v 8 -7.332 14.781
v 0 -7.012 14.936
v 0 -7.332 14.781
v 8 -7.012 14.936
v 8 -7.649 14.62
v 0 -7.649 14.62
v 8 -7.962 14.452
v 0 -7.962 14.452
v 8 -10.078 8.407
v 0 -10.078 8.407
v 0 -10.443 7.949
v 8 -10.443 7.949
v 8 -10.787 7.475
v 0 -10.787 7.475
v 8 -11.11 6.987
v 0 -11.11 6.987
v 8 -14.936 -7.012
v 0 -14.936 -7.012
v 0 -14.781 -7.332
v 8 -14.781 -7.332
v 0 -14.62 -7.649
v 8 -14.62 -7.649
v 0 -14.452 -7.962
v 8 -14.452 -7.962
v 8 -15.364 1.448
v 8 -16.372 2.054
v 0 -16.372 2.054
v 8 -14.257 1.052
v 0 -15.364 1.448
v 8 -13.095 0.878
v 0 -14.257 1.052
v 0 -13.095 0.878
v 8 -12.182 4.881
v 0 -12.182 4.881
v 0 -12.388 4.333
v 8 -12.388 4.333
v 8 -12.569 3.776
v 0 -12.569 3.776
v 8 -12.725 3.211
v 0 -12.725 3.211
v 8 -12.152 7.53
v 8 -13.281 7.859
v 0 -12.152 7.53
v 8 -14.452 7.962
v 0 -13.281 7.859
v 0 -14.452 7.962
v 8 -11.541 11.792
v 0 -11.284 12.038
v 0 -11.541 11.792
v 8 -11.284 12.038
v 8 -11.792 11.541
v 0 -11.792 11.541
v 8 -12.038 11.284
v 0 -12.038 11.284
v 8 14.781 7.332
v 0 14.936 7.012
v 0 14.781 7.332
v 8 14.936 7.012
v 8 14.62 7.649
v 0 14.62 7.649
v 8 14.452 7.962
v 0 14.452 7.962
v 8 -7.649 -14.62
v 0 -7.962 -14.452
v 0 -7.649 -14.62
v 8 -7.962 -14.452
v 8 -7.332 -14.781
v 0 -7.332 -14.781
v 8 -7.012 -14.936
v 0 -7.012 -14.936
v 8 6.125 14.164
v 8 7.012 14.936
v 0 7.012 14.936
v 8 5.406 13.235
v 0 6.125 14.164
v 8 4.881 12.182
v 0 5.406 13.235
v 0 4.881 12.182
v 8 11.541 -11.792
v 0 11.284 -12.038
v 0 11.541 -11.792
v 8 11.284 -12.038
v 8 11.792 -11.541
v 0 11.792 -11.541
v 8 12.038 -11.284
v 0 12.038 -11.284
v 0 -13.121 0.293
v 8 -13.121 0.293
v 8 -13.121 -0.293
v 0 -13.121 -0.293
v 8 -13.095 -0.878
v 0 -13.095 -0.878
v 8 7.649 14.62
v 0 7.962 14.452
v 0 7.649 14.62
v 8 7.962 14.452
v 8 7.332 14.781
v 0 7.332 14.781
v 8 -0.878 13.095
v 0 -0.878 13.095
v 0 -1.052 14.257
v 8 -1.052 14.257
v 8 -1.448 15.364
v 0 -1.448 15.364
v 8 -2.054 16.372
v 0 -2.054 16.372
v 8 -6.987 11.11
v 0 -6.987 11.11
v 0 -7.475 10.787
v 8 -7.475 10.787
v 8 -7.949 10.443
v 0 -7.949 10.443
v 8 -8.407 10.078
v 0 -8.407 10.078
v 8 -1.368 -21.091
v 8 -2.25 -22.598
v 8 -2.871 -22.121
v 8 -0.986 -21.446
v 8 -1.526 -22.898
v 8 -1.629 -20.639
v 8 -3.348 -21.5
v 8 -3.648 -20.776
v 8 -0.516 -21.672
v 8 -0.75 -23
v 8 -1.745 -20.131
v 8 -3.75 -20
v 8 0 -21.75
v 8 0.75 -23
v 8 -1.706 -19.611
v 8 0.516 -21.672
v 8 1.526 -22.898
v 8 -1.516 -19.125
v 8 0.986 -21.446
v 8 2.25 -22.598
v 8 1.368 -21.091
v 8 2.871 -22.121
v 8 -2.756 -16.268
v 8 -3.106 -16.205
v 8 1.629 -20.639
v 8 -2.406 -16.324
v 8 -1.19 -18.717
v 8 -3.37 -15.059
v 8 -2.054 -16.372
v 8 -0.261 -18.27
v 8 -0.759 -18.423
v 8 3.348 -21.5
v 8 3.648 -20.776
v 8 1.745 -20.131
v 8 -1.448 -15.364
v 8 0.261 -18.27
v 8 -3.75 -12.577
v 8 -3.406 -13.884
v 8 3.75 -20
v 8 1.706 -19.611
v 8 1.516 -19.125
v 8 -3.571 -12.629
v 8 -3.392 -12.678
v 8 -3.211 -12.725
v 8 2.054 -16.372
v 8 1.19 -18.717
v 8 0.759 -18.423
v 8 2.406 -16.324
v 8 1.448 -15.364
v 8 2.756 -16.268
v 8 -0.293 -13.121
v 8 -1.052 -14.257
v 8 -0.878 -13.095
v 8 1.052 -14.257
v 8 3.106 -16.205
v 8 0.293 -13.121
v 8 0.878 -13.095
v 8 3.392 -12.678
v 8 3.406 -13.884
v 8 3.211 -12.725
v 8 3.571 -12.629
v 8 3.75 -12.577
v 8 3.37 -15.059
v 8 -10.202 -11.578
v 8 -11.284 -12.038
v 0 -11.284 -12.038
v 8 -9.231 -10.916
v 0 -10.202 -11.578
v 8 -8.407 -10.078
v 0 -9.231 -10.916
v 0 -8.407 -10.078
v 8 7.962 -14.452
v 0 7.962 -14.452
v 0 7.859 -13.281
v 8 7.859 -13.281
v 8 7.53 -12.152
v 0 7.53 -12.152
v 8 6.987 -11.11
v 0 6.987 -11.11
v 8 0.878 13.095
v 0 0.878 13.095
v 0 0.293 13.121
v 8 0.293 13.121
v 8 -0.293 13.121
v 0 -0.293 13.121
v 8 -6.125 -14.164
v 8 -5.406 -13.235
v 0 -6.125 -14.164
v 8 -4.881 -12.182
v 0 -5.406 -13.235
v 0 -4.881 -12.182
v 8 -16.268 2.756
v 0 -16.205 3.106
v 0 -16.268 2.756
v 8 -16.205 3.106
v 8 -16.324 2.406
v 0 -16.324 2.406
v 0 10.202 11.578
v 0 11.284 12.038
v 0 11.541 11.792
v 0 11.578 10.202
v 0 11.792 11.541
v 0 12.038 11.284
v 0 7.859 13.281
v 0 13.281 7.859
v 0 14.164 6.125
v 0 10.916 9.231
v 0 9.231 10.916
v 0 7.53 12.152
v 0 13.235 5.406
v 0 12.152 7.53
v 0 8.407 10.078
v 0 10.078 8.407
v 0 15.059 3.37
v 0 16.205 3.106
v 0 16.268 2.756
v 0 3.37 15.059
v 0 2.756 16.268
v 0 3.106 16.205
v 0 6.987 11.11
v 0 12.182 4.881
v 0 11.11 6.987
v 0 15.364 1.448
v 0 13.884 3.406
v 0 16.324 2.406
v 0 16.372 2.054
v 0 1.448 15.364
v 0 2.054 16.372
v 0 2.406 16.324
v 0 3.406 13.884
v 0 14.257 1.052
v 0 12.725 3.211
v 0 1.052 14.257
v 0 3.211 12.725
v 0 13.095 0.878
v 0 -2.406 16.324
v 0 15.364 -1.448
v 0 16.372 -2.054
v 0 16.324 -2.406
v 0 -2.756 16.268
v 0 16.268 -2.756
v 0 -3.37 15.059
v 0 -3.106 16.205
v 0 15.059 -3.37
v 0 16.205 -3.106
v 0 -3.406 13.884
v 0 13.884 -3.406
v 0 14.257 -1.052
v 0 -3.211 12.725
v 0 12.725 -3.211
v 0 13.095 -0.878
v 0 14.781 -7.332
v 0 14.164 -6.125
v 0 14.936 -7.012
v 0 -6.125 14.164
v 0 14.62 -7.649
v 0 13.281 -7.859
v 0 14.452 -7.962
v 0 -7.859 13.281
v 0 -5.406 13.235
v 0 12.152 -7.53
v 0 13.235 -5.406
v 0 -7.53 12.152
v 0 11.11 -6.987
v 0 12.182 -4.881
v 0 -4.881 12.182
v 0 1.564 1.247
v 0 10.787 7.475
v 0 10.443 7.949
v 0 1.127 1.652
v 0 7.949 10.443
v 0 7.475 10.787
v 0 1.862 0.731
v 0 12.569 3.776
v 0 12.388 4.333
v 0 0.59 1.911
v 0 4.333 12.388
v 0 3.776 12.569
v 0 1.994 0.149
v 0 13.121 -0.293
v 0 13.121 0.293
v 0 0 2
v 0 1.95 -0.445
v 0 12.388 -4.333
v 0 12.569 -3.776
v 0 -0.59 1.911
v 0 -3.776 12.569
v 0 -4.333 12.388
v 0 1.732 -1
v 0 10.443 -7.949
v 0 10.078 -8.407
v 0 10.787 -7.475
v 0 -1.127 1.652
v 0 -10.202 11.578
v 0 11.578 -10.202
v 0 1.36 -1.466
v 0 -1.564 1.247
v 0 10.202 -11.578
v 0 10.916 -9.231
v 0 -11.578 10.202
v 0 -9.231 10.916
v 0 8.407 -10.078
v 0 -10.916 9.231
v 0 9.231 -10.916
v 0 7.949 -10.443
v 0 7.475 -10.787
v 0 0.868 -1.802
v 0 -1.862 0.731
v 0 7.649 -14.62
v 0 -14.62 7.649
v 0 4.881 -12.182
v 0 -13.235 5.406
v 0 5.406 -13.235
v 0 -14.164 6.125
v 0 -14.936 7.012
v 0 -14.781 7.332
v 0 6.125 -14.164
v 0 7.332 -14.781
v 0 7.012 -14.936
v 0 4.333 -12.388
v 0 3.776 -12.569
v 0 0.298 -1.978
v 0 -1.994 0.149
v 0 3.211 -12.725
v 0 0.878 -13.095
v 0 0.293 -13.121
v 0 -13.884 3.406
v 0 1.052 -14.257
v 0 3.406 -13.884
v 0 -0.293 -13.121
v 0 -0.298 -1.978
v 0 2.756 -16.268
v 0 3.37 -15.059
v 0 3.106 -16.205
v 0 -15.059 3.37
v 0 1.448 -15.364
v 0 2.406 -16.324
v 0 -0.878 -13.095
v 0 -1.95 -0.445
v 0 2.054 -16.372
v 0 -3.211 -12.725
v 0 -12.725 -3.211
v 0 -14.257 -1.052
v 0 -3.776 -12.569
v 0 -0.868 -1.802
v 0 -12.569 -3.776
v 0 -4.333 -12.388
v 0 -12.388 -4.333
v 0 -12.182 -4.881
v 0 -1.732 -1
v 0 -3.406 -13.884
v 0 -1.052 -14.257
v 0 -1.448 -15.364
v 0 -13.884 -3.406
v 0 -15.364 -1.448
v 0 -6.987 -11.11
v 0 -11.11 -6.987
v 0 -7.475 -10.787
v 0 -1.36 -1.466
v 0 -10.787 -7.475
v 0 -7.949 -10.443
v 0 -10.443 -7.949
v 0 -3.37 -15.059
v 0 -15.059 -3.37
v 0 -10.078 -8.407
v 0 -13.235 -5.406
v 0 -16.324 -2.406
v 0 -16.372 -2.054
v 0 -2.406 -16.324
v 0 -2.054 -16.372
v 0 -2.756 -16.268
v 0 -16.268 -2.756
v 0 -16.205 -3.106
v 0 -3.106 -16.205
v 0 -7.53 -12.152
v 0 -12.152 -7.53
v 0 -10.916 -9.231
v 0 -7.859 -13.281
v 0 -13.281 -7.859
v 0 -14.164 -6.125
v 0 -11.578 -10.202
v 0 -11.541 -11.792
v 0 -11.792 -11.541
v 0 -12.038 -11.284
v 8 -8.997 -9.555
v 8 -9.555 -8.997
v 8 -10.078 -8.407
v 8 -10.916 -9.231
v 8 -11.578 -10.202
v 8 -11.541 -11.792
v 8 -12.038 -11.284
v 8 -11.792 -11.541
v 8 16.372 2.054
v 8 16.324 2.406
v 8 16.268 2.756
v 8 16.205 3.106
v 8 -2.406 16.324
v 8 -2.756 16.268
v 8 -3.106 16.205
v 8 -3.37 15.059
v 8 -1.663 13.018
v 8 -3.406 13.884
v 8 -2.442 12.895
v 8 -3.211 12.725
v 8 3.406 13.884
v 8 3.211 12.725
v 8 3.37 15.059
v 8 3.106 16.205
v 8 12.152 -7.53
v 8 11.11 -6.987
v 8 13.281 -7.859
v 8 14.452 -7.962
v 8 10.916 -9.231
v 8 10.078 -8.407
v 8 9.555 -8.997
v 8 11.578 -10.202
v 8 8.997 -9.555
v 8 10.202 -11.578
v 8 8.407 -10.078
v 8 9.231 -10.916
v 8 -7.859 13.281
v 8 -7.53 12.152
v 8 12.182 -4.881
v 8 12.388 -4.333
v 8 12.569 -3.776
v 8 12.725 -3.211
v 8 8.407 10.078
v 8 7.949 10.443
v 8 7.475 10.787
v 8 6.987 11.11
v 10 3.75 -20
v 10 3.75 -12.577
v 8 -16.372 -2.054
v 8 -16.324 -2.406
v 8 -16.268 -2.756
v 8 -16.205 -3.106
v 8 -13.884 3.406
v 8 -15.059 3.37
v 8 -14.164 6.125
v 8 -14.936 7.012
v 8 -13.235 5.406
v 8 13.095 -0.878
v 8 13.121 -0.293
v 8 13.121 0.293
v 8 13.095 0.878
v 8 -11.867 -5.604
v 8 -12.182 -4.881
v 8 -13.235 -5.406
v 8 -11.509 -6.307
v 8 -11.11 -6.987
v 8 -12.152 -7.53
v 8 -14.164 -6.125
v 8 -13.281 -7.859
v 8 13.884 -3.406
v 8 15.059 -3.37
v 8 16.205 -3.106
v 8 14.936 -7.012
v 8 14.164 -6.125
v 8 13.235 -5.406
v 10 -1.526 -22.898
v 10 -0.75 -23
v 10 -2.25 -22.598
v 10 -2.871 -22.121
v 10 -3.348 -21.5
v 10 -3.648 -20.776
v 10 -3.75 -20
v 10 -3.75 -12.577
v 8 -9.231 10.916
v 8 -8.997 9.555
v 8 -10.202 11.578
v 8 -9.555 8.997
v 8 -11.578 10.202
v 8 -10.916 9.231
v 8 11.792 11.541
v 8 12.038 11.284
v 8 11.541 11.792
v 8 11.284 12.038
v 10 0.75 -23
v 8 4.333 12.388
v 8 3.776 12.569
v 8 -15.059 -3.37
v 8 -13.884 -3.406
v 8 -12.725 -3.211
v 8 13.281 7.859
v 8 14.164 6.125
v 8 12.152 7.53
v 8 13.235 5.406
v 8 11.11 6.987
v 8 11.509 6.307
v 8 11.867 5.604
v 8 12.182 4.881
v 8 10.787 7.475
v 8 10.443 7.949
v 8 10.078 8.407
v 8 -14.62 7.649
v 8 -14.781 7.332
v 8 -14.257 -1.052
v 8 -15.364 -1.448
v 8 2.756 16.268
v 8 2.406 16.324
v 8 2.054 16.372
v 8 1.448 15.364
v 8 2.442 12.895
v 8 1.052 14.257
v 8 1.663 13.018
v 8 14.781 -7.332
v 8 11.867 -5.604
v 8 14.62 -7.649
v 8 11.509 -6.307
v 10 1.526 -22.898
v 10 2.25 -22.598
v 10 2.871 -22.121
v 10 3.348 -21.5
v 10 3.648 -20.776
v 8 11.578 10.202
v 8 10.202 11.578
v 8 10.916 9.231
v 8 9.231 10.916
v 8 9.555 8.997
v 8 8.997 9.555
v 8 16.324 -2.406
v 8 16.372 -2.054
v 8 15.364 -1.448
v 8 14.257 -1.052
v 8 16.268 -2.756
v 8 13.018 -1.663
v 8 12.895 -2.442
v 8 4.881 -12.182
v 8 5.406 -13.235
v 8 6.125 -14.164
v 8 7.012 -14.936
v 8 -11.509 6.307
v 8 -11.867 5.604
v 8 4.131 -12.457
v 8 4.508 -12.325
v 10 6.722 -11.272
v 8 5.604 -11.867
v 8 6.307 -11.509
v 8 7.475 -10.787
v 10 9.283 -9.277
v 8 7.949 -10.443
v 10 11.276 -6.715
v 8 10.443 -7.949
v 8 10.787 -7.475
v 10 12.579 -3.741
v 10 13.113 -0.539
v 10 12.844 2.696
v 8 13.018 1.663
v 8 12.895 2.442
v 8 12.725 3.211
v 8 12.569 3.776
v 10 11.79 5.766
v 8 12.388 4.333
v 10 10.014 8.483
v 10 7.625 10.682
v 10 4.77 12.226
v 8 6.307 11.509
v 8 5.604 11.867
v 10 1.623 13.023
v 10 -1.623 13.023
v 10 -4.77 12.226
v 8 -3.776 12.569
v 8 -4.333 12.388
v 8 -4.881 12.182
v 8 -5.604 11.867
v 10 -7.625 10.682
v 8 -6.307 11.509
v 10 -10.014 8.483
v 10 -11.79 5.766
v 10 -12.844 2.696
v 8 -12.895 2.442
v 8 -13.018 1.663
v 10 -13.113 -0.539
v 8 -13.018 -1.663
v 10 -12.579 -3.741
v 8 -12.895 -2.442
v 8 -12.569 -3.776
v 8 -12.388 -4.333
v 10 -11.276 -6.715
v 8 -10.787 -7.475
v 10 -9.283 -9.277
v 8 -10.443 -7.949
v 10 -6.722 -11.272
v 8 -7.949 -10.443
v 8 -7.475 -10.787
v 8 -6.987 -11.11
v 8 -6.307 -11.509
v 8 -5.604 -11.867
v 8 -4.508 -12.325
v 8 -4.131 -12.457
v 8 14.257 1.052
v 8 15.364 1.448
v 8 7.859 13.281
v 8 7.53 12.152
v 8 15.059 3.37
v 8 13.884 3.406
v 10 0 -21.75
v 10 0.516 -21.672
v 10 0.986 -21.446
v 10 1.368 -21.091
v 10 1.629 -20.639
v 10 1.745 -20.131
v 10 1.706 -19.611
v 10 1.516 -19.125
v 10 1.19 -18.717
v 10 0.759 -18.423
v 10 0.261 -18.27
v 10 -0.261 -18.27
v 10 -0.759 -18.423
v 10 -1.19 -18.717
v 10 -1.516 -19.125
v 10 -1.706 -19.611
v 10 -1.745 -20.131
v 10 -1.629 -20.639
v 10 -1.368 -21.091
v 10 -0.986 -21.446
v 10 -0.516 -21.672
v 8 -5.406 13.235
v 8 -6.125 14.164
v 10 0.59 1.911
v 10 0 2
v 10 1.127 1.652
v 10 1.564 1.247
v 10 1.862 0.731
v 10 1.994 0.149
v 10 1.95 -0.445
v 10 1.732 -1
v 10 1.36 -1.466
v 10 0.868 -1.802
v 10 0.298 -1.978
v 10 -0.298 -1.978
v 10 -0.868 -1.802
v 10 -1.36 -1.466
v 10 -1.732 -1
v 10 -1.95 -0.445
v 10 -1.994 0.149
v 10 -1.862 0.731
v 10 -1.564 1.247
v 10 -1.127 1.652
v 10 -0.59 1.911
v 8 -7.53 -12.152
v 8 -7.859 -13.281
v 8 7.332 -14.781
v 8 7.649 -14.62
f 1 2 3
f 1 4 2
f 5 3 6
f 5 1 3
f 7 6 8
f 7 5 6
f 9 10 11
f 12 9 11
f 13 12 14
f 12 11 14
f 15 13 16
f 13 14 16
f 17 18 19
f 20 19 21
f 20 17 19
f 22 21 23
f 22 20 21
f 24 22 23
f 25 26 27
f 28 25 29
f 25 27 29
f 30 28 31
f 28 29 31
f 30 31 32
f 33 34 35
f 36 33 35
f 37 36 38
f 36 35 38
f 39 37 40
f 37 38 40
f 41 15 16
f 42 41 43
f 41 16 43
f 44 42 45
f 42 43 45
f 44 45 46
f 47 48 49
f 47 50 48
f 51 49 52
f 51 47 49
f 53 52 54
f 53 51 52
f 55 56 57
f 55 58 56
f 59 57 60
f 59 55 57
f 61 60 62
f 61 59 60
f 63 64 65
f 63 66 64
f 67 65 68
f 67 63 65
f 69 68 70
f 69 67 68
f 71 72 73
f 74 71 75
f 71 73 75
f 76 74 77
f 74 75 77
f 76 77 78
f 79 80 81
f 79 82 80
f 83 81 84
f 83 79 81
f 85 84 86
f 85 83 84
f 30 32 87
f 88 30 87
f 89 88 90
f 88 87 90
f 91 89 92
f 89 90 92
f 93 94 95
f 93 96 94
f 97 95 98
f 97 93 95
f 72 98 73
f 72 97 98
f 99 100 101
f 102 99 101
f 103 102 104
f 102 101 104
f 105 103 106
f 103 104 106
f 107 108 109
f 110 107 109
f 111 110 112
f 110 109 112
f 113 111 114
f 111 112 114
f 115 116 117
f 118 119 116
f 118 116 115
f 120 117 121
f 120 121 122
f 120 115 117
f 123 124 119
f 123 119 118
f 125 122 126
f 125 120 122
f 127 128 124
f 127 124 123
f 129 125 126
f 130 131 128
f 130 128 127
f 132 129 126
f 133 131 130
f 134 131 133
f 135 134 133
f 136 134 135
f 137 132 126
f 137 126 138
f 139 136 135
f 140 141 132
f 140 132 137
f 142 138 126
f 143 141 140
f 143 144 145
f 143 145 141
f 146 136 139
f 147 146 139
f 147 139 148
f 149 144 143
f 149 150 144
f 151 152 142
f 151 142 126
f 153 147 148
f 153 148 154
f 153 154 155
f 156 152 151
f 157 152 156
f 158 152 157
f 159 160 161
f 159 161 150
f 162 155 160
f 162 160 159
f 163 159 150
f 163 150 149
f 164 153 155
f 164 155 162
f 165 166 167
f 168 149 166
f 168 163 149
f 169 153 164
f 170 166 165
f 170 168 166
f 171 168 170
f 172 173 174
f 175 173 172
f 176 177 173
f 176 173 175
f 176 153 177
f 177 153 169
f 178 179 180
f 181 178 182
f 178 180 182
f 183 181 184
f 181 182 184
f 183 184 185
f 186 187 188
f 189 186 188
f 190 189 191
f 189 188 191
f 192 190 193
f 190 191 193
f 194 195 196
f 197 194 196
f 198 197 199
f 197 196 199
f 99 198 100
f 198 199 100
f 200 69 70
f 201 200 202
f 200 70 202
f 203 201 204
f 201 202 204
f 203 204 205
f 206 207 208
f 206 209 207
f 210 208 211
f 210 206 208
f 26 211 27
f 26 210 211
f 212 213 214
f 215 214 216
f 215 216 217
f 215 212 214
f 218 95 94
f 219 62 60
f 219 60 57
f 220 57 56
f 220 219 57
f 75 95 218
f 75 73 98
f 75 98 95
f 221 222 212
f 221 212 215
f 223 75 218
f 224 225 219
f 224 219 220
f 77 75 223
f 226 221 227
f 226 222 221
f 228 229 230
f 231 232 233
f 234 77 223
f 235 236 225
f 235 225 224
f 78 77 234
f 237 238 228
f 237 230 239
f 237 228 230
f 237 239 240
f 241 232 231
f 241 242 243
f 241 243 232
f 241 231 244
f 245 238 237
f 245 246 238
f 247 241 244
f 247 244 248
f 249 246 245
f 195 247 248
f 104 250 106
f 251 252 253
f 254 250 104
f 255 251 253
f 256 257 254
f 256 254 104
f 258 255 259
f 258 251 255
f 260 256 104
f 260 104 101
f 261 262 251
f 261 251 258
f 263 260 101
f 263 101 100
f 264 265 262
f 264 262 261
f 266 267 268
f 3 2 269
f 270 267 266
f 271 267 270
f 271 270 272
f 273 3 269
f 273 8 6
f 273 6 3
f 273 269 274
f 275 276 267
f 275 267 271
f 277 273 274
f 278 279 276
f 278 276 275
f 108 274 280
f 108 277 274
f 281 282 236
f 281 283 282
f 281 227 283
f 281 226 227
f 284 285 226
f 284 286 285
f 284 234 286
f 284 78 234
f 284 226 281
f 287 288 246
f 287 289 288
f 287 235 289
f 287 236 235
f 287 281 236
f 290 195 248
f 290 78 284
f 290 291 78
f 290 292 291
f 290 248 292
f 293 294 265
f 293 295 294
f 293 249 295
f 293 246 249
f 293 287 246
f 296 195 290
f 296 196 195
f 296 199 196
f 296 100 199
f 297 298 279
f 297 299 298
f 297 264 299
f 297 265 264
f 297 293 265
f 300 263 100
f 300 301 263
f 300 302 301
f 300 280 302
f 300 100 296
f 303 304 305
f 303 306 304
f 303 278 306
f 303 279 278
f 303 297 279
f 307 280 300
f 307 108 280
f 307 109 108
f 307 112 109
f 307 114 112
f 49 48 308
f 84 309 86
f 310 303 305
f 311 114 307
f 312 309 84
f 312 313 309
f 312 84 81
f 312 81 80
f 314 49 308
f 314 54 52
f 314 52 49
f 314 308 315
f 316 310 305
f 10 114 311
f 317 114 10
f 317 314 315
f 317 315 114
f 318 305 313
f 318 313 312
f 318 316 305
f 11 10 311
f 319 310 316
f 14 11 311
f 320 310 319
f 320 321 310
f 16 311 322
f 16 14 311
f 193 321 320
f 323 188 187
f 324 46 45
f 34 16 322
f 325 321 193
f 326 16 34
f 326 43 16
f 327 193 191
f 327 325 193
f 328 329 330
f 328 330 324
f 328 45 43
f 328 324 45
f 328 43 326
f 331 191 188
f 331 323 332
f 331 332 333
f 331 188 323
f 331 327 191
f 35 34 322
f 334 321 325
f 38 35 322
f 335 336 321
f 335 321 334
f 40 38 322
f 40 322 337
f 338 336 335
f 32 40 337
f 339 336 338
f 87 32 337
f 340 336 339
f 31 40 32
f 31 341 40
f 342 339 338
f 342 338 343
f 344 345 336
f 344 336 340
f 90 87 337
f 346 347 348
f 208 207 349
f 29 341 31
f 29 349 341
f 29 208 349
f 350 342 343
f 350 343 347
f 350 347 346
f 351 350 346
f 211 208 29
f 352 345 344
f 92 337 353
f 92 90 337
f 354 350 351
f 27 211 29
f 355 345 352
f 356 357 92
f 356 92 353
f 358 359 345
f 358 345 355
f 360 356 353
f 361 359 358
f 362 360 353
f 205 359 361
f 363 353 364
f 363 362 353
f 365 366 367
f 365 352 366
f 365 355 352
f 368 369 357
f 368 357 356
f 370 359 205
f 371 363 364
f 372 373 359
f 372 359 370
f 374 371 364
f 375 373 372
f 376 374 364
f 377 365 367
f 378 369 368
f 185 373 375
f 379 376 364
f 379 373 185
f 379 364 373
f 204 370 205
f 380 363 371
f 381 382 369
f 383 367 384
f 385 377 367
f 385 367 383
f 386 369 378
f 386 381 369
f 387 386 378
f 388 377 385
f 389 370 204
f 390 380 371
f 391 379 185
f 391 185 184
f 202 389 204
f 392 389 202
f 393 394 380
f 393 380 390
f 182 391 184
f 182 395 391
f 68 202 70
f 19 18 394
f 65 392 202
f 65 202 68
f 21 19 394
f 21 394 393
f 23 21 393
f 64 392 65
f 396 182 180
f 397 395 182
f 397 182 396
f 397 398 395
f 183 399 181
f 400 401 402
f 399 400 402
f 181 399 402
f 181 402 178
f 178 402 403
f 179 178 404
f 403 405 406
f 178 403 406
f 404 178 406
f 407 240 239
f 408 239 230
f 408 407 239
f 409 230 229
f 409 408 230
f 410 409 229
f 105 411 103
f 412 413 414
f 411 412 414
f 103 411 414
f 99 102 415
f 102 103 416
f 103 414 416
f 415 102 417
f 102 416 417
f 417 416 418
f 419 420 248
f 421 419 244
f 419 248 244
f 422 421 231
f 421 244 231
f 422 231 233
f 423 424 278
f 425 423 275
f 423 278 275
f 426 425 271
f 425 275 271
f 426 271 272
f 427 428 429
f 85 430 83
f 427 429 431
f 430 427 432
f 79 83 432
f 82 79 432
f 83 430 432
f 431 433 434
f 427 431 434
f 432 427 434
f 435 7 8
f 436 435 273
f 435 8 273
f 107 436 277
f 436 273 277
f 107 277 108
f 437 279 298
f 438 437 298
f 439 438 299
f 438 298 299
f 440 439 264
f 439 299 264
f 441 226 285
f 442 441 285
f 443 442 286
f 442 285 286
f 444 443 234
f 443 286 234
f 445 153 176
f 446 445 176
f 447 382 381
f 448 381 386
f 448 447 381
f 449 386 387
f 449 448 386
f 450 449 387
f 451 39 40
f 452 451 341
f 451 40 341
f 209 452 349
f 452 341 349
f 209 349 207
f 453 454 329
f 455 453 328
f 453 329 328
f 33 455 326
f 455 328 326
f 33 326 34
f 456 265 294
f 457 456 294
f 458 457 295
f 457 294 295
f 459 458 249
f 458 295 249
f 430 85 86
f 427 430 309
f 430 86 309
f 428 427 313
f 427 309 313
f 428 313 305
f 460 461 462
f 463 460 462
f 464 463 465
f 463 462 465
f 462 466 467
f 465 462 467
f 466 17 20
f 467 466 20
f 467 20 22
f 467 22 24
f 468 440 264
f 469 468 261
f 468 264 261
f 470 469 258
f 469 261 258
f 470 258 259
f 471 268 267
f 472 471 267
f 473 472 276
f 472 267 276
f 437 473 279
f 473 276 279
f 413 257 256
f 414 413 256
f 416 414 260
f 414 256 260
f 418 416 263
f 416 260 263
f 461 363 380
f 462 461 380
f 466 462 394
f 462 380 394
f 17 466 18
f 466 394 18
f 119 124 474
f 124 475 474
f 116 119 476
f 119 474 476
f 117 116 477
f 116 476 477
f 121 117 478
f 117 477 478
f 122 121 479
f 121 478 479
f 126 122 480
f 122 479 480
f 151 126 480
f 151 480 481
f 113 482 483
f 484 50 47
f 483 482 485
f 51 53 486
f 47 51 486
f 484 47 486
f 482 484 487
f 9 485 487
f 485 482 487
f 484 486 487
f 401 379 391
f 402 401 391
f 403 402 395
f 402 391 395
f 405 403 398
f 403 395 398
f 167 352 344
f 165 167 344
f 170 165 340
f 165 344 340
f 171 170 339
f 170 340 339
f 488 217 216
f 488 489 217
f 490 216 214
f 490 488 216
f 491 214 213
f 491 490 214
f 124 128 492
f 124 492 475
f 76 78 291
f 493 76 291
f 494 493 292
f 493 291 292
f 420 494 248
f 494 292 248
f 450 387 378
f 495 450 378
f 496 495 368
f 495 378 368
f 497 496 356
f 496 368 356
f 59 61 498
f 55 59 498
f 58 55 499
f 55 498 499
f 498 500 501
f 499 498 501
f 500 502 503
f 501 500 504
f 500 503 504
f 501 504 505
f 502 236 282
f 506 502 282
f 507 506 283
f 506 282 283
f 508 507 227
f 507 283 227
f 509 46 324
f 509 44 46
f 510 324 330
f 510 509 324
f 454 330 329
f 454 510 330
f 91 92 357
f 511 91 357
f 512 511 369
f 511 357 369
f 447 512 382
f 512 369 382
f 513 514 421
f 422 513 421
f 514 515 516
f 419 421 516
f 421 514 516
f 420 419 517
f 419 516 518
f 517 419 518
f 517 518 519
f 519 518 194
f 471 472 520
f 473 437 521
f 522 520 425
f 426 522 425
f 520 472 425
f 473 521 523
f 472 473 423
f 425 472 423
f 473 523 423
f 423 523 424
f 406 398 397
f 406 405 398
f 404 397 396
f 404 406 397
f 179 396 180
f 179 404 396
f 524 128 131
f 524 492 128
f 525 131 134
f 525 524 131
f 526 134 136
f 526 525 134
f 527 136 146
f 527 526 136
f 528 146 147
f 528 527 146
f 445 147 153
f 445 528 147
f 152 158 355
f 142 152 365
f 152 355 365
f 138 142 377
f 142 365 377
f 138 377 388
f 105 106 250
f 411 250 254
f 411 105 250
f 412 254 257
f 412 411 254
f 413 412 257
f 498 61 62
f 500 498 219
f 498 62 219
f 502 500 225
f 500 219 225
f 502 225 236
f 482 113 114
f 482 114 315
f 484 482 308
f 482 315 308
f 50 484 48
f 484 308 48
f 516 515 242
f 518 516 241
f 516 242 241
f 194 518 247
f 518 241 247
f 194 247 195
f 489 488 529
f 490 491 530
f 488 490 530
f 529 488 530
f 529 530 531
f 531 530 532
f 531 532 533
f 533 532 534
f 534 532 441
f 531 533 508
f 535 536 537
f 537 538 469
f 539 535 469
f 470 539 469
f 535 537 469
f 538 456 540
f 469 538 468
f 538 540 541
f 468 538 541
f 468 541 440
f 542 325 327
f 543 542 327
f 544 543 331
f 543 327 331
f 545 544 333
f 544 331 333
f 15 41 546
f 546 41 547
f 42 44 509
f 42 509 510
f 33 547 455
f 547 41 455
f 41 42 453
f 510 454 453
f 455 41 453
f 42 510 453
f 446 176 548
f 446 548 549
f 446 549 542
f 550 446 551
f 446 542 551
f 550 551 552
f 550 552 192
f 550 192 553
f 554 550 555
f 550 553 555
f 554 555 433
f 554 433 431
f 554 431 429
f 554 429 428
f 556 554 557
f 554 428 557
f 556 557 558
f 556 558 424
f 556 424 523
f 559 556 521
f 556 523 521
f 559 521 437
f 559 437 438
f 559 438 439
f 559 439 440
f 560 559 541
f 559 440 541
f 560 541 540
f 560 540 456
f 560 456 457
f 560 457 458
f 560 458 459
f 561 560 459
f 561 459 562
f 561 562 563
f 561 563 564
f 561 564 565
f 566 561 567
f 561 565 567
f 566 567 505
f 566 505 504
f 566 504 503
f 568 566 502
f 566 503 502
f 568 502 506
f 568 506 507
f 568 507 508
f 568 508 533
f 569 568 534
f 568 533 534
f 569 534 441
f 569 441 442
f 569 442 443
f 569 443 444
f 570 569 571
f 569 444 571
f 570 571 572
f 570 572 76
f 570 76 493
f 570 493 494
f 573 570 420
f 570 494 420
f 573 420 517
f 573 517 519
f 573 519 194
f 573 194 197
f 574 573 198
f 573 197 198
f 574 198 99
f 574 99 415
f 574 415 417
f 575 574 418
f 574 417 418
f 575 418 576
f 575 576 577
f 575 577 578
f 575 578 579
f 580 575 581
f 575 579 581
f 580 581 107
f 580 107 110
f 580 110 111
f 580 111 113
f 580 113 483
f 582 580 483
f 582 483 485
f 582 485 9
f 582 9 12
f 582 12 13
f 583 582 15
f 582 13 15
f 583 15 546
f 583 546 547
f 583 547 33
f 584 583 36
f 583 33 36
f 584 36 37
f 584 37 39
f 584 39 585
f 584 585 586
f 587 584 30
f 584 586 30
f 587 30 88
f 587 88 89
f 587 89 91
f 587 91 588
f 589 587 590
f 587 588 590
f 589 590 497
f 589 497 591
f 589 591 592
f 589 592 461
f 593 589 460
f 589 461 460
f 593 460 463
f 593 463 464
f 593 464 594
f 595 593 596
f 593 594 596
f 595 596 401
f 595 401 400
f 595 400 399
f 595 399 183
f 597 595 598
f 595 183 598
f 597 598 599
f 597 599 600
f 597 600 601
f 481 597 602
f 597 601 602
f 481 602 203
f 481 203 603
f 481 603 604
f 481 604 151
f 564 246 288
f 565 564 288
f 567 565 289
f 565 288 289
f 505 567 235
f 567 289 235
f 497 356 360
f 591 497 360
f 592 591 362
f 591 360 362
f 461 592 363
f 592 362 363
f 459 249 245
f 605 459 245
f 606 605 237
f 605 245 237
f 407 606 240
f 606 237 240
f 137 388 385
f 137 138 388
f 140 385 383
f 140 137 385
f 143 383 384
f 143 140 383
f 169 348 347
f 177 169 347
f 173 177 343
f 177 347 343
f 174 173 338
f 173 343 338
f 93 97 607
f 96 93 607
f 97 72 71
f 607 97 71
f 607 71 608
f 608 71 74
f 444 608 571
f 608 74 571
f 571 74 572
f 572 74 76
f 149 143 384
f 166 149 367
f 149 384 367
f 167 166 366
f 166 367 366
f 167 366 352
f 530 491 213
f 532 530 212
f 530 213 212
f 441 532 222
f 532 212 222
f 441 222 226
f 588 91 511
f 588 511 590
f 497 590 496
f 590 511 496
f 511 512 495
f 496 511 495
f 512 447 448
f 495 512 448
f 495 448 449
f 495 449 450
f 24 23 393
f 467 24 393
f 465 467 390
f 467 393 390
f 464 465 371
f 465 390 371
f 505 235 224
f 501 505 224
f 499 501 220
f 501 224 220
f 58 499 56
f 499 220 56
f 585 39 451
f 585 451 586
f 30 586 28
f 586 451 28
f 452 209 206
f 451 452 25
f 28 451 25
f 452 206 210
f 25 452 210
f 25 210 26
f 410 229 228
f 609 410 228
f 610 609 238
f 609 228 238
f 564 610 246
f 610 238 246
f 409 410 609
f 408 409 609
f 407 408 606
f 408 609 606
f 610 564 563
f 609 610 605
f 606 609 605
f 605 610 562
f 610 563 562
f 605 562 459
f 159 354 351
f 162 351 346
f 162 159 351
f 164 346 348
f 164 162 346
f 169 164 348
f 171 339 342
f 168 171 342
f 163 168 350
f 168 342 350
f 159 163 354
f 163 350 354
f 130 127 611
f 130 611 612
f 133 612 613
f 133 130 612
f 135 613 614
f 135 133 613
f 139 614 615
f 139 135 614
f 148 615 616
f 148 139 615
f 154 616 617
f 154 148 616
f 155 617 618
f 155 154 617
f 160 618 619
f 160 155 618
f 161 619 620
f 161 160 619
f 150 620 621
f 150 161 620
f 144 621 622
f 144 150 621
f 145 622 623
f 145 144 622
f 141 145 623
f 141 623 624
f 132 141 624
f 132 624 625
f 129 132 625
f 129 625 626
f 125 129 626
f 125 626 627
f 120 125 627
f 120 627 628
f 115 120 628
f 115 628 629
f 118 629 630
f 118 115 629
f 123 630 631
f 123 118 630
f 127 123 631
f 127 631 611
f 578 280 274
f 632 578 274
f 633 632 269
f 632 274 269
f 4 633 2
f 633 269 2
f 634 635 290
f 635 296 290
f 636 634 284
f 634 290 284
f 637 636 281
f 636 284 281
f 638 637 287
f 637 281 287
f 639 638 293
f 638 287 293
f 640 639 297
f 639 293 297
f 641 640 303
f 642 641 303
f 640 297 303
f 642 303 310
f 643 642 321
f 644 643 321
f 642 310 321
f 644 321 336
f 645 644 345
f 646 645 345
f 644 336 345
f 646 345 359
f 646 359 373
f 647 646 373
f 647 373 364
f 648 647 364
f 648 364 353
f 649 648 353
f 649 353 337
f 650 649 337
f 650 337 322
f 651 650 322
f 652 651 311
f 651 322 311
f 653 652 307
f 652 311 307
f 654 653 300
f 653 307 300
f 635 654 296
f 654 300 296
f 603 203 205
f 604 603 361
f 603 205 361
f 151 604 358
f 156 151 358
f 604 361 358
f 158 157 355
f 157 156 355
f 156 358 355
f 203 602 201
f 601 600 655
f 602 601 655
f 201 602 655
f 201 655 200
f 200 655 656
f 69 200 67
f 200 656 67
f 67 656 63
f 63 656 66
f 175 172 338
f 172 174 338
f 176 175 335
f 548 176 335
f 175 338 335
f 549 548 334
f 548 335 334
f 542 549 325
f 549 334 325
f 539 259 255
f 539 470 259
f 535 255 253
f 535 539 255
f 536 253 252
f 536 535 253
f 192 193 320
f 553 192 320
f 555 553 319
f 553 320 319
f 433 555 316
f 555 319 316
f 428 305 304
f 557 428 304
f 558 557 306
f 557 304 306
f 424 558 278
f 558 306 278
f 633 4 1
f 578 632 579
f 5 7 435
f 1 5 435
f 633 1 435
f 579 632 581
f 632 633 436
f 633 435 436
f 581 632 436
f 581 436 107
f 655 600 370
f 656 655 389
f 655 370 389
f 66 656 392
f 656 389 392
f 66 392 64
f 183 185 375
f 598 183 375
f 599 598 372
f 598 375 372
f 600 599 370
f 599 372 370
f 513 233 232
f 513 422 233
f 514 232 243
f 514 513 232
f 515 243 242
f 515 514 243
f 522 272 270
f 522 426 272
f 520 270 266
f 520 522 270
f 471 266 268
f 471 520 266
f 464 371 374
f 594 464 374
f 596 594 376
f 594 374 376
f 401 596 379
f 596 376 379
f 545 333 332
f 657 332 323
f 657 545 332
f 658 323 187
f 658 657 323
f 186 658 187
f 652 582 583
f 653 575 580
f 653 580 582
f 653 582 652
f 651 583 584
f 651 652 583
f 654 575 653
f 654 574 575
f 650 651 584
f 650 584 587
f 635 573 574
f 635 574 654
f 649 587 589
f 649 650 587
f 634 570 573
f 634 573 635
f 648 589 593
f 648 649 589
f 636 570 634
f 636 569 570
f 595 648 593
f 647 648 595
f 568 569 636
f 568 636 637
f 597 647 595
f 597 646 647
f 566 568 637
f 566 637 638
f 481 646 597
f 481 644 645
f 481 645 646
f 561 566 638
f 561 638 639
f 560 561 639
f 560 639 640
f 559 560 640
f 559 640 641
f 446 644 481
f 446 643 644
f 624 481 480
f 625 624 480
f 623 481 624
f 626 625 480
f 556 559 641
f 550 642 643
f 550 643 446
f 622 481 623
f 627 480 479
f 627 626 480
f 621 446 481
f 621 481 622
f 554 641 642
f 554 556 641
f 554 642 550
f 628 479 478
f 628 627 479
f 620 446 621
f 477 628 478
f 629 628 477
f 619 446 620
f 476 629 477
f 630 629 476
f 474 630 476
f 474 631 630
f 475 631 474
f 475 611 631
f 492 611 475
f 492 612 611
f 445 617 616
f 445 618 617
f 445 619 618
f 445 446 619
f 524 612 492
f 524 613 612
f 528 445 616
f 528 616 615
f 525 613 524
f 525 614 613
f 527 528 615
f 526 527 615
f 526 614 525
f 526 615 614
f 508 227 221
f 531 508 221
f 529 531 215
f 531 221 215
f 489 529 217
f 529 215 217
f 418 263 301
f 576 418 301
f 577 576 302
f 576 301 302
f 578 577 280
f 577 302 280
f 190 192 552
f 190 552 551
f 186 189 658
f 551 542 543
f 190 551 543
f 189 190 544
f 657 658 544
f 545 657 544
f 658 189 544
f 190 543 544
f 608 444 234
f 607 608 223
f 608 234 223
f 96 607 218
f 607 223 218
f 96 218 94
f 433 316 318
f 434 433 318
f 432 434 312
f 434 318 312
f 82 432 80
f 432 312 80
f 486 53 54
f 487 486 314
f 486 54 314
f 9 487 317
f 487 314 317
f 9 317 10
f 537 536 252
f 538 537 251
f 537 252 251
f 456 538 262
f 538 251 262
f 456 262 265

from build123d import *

# Parameters (mm, degrees)
BASPROSKE_W         = 8
BASPROSKE_H         = 16.5
TOOTHCUT_DEPTH      = 25.667792767
TEETHCUTS_COUNT     = 20
TEETHCUTS_ANGLE     = 342
BORSKE_R            = 2
BORE_DEPTH          = 50.0000508
SKETCH1_R           = 1.75
BOSS_EXTRUDE1_DEPTH = 2
BOSS_EXTRUDE2_DEPTH = 2
SKETCH3_R           = 2
CUT_EXTRUDE1_DEPTH  = 15
FILLET1_R           = 3


with BuildPart() as part:
    # BasProSke → Base-Revolve (revolve)
    with BuildSketch(Plane(origin=(0, 0, 0), x_dir=(1, 0, 0), z_dir=(0, 1, 0)), mode=Mode.PRIVATE) as base_revolve_sk:
        with Locations((4, 8.25)):
            Rectangle(BASPROSKE_W, BASPROSKE_H)
    revolve(base_revolve_sk.sketch.rotate(Axis((-10, 0, 0), (1, 0, 0)), 180), axis=Axis((-10, 0, 0), (1, 0, 0)))

    # TooCutSke → ToothCut (cut, through all)
    with BuildSketch(Plane(origin=(0, 0, 0), x_dir=(0, 0, -1), z_dir=(1, 0, 0))):
        with BuildLine():
            ThreePointArc((0.877929023, 13.094602576), (0, 13.124), (-0.877929023, 13.094602576))
            ThreePointArc((-0.877929023, 13.094602576), (-1.227785764, 14.834041313), (-2.071065599, 16.395106966))
            ThreePointArc((-2.071065599, 16.395106966), (0, 16.5254), (2.071065599, 16.395106966))
            ThreePointArc((2.071065599, 16.395106966), (1.227785764, 14.834041313), (0.877929023, 13.094602576))
        make_face()
    toothcut = extrude(amount=TOOTHCUT_DEPTH, mode=Mode.SUBTRACT)

    # TeethCuts: ToothCut ×20 about axis
    teethcuts_axis = Axis((-10, 0, 0), (1, 0, 0))
    for i in range(1, TEETHCUTS_COUNT):
        add(toothcut.rotate(teethcuts_axis, i * TEETHCUTS_ANGLE / (TEETHCUTS_COUNT - 1)), mode=Mode.SUBTRACT)

    # BorSke → Bore (cut, symmetric)
    with BuildSketch(Plane(origin=(0, 0, 0), x_dir=(0, 0, -1), z_dir=(1, 0, 0))):
        with Locations(Location((0, 0, 0), (0, 0, 180))):
            Circle(BORSKE_R)
    extrude(amount=BORE_DEPTH, both=True, mode=Mode.SUBTRACT)

    # Sketch1 → Boss-Extrude1 (add)
    with BuildSketch(Plane(origin=(8, 0, 0), x_dir=(0, 0, -1), z_dir=(1, 0, 0))):
        Polygon((0, 0), (0, 3.75), (20, 3.75), (23, 3.75), (23, -3.75), (0, -3.75), align=None)
        with Locations((20, 0)):
            Circle(SKETCH1_R, mode=Mode.SUBTRACT)
    extrude(amount=BOSS_EXTRUDE1_DEPTH)

    # Sketch2 → Boss-Extrude2 (add)
    with BuildSketch(Plane(origin=(8, 0, 0), x_dir=(0, 0, -1), z_dir=(1, 0, 0))):
        with BuildLine():
            Line((0, 3.75), (12.576838872, 3.75))
            ThreePointArc((12.576838872, 3.75), (-13.124, 0), (12.576838872, -3.75))
            Line((12.576838872, -3.75), (0, -3.75))
            Line((0, -3.75), (0, 3.75))
        make_face()
    extrude(amount=BOSS_EXTRUDE2_DEPTH)

    # Sketch3 → Cut-Extrude1 (cut)
    with BuildSketch(Plane.ZY):
        Circle(SKETCH3_R)
    extrude(amount=-CUT_EXTRUDE1_DEPTH, mode=Mode.SUBTRACT)

    # Fillet1
    fillet1_edges = [part.edges().sort_by_distance(p)[0] for p in [
        (9, -3.75, -23),
        (9, 3.75, -23),
    ]]
    fillet(fillet1_edges, radius=FILLET1_R)


solid = part.part
